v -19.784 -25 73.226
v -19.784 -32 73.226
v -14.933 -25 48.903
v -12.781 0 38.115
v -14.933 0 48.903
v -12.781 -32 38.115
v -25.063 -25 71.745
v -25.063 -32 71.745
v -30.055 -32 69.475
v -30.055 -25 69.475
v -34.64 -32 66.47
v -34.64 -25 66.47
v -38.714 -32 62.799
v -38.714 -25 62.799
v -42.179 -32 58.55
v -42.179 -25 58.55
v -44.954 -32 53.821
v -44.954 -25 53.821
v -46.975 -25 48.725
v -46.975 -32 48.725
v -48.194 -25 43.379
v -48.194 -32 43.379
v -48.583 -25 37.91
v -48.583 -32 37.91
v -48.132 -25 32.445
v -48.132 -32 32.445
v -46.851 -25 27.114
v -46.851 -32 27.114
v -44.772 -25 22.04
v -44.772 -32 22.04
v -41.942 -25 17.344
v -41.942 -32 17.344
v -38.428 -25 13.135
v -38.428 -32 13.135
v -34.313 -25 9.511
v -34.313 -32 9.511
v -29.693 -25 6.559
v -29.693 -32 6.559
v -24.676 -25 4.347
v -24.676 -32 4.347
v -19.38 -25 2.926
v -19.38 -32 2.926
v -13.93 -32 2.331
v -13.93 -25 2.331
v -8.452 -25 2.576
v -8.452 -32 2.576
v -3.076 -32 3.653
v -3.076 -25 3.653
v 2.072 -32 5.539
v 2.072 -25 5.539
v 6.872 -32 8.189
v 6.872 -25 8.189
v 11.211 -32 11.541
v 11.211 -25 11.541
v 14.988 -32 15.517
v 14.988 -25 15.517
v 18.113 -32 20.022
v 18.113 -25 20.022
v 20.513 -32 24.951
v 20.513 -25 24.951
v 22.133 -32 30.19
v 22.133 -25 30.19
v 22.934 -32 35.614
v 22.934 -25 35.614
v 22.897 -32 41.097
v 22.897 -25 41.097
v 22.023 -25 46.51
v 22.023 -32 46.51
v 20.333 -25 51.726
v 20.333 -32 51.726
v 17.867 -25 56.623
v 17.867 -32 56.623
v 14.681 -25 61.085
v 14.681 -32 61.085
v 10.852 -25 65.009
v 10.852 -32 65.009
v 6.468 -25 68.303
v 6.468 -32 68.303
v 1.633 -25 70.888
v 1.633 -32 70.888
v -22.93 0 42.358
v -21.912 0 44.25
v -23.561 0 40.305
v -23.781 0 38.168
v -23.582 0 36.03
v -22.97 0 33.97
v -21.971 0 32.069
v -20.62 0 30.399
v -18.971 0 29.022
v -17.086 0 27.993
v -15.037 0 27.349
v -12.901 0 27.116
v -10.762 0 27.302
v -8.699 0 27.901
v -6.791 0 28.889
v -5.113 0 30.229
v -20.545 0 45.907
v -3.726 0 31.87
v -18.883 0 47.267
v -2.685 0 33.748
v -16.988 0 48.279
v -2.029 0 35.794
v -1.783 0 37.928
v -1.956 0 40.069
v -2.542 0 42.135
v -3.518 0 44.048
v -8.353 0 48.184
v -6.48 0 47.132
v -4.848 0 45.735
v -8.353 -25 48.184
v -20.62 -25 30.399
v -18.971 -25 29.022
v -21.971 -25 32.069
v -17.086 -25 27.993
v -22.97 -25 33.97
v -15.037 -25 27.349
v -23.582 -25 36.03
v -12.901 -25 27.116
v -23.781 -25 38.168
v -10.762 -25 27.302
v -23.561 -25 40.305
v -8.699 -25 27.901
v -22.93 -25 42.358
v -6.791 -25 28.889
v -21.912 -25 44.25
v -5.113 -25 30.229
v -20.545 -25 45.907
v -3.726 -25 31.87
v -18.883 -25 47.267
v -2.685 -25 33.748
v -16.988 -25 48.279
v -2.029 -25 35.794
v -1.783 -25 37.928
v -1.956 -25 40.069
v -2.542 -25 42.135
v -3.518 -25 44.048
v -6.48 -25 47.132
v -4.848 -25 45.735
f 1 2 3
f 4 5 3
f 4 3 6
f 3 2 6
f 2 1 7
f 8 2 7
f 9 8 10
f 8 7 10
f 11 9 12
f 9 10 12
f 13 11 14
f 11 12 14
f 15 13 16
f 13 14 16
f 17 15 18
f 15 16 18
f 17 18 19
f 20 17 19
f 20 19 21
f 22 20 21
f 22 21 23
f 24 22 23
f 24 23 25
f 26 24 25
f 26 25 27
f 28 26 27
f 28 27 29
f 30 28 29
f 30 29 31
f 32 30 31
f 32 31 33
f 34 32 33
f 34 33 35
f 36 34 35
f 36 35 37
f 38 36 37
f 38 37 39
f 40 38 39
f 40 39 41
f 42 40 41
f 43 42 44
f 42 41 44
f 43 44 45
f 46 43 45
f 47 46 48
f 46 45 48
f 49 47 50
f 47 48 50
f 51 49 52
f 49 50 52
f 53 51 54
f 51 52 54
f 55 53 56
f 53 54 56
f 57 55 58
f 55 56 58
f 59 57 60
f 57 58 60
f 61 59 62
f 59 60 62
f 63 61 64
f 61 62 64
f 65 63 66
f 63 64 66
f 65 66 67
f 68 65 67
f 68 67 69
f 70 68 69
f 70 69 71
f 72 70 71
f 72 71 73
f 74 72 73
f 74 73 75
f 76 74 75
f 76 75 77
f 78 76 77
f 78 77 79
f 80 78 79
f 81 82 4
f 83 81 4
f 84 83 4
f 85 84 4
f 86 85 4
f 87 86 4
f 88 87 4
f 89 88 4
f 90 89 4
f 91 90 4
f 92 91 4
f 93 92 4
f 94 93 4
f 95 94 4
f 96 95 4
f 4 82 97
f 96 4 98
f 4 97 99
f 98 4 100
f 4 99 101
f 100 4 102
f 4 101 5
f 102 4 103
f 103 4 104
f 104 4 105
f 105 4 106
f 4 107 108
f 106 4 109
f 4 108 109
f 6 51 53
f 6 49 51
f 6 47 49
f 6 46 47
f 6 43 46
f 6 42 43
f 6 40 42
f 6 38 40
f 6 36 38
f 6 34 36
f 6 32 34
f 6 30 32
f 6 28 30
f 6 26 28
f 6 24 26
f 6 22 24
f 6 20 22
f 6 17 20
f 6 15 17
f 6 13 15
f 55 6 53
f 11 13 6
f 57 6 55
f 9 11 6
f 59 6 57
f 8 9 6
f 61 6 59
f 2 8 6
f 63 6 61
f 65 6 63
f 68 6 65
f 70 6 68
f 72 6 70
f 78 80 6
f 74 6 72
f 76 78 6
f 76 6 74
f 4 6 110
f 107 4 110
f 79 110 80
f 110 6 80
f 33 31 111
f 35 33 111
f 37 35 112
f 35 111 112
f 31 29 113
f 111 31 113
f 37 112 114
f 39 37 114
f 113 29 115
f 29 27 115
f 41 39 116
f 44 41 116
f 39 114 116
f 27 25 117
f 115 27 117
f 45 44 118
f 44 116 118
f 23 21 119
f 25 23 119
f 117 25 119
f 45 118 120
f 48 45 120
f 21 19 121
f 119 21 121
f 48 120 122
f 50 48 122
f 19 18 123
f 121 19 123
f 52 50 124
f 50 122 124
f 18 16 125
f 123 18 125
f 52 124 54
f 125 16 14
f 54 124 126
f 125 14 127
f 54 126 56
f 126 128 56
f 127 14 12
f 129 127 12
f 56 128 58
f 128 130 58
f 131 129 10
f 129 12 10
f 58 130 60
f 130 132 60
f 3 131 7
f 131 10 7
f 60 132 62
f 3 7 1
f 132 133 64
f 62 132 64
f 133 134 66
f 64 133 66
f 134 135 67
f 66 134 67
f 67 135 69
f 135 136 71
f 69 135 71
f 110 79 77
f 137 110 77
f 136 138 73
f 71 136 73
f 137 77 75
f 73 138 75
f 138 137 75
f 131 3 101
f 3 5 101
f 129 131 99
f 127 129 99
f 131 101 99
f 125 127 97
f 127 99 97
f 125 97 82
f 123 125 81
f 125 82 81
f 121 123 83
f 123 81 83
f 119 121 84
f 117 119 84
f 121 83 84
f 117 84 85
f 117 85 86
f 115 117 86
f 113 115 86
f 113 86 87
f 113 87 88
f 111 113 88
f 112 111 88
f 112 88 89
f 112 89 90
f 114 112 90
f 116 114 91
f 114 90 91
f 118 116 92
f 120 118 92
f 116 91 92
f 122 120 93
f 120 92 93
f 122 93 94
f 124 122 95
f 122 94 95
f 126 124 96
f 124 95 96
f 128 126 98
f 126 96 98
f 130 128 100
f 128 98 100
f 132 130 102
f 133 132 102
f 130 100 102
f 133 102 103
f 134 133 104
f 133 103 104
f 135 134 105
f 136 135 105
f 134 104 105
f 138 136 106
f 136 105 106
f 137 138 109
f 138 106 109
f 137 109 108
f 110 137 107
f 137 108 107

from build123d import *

# Parameters (mm, degrees)
F0_R     = 11
F1_DEPTH = 25
F2_R     = 35.80237
F3_DEPTH = 7
F5_DEPTH = 32.001


with BuildPart() as f1:
    # F0 (on Front) → F1 (new body)
    with BuildSketch(Plane.XZ):
        with Locations((-12.781085, 38.115203)):
            Circle(F0_R)
    extrude(amount=F1_DEPTH)

    # F2 (on face) → F3 (join)
    with BuildSketch(Plane.XZ.offset(25)):
        with Locations((-12.781085, 38.115203)):
            Circle(F2_R)
    extrude(amount=F3_DEPTH)

    # F4 (on face) → F5 (cut, through all)
    with BuildSketch(Plane.XZ.offset(32)):
        Polygon((-7.421601, 82.684956), (-19.784253, 73.225961), (-12.781085, 38.115203), (1.632773, 70.887911), align=None)
    extrude(amount=-F5_DEPTH, mode=Mode.SUBTRACT)


solid = f1.part
